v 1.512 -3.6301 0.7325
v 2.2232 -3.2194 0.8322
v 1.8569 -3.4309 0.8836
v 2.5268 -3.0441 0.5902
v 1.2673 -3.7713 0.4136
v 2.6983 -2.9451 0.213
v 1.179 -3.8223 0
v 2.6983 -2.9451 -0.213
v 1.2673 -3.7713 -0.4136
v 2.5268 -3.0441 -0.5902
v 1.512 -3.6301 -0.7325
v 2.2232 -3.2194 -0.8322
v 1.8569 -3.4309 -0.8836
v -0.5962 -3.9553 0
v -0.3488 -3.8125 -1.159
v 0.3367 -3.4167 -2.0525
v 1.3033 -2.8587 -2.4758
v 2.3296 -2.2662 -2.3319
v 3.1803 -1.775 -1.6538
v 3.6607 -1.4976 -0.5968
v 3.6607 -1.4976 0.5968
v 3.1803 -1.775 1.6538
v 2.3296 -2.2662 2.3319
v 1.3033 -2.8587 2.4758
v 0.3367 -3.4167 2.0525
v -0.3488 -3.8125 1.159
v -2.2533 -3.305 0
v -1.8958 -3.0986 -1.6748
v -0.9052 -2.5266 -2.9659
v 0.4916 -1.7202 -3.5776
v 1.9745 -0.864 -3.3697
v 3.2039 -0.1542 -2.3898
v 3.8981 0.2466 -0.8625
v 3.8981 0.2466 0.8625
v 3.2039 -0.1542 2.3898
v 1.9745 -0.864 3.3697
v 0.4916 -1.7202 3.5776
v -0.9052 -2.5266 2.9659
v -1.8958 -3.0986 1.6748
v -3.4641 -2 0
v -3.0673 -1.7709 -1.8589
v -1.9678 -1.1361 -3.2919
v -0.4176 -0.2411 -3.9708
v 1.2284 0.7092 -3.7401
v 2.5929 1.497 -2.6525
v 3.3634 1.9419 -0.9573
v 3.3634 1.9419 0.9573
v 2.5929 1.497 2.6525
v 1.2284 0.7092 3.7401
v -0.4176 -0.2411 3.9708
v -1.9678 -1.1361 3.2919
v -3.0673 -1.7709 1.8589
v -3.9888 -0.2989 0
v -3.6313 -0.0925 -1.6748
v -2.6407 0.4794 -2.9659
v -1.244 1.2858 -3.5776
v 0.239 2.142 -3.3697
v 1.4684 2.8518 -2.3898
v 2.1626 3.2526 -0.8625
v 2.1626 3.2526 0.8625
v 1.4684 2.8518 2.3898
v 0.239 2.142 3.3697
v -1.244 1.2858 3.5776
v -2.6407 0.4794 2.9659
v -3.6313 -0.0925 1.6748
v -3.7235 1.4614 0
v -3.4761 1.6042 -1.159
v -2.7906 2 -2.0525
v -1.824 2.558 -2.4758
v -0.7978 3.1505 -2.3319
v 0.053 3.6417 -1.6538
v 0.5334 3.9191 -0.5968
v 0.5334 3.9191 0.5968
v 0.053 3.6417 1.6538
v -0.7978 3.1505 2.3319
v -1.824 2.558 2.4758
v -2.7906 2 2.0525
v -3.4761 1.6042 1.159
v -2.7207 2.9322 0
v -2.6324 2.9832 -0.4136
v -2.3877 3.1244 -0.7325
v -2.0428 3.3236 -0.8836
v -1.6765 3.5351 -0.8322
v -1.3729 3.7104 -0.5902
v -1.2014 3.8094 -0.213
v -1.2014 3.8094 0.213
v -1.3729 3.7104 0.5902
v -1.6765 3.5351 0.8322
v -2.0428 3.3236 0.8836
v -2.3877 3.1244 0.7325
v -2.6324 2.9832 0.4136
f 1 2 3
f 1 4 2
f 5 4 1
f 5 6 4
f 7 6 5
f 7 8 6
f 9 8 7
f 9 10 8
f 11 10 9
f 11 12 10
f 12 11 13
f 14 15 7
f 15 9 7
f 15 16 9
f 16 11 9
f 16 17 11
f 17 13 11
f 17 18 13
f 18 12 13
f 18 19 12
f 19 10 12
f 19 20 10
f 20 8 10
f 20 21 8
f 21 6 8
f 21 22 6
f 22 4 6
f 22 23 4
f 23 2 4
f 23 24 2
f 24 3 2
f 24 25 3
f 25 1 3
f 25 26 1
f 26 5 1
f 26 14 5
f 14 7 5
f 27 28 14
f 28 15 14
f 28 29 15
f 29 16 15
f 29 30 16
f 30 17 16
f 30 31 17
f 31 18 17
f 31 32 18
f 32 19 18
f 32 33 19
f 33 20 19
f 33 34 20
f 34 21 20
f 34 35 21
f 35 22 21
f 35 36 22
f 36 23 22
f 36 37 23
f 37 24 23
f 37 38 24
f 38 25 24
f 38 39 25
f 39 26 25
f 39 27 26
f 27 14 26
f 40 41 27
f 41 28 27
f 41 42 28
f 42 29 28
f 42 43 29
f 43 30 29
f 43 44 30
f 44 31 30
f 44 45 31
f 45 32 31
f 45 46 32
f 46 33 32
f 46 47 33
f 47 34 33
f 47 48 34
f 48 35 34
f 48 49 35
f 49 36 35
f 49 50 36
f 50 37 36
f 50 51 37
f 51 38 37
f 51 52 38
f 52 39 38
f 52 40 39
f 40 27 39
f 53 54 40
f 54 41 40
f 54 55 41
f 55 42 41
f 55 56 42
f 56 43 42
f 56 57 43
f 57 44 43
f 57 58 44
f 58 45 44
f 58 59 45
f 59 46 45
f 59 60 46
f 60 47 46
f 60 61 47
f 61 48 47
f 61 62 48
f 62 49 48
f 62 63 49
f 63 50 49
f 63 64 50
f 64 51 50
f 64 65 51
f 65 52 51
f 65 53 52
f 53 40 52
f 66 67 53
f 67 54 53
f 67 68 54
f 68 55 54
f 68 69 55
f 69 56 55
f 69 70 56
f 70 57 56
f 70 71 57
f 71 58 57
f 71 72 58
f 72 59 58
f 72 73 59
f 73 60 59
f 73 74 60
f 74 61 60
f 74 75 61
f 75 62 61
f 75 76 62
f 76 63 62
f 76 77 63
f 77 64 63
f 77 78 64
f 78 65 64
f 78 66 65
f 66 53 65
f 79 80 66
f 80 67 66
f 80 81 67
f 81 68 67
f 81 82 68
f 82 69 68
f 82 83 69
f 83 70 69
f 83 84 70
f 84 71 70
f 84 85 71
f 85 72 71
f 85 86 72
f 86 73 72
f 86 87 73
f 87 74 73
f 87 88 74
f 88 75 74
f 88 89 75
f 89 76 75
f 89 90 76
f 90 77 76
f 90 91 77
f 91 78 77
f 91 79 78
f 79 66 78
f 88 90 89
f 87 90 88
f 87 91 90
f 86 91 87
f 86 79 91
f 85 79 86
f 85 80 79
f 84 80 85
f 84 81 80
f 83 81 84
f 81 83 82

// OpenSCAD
// Generated by generate_scads.py
rotate([90,180,30]) {
  sphere(r=4);
}
